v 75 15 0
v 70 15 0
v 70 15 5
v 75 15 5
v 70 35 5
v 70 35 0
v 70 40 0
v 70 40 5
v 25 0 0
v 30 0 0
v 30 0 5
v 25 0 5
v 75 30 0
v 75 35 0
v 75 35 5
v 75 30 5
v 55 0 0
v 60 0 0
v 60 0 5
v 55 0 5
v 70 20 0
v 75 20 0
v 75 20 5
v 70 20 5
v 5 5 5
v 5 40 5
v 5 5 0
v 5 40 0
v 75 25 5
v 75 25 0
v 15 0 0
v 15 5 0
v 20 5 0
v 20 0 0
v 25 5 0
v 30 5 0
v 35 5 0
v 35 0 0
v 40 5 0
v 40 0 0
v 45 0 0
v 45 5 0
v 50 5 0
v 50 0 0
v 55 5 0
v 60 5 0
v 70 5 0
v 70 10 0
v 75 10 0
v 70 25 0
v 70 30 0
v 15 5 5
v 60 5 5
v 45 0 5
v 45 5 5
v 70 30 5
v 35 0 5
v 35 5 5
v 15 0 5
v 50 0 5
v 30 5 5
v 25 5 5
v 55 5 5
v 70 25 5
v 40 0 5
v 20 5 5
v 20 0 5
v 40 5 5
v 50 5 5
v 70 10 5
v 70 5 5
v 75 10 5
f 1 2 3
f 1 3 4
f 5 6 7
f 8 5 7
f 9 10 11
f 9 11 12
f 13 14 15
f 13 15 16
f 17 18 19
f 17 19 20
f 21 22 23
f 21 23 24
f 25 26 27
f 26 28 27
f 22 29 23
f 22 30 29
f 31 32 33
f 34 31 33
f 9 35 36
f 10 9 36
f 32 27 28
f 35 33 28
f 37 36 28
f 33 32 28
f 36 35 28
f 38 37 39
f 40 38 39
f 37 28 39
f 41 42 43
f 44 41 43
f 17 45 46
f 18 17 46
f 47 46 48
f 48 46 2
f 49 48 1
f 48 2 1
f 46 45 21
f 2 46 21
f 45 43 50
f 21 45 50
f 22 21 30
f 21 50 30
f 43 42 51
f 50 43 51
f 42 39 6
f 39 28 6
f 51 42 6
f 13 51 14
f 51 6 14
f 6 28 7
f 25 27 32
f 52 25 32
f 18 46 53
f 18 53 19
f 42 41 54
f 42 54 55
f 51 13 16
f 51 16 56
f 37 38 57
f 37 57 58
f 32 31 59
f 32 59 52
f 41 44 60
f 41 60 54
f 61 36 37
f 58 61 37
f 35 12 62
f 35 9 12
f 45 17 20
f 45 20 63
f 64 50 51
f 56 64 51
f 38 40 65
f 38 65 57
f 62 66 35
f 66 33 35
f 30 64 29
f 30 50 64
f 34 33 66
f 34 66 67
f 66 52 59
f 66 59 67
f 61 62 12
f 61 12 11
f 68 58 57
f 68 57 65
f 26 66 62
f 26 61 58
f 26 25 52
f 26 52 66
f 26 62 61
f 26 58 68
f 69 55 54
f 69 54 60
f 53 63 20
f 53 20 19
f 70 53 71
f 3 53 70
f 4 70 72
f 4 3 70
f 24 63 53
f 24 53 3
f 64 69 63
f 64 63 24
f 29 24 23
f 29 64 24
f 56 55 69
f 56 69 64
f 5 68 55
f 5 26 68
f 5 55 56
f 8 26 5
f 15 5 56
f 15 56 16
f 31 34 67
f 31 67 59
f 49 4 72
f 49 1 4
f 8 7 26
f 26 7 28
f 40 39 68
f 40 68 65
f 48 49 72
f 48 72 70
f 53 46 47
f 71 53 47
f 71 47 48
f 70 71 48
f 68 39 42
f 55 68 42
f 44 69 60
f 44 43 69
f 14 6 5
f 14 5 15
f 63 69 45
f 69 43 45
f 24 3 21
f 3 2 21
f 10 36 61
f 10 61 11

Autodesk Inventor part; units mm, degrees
ref_plane "YZ Plane" through (0, 0, 0) normal (1, 0, 0) x (0, 1, 0)
ref_plane "XZ Plane" through (0, 0, 0) normal (0, 1, 0) x (-1, 0, 0)
ref_plane "XY Plane" through (0, 0, 0) normal (0, 0, 1) x (1, 0, 0)
sketch "Sketch2" plane through (0, 0, 0) normal (0, 0, 1) x (1, 0, 0)
  line L0 (5, 5) -> (70, 5)
  line L1 (70, 5) -> (70, 40)
  line L2 (70, 40) -> (5, 40)
  line L3 (5, 40) -> (5, 5)
  line L4 (15, 5) -> (20, 5)
  line L5 (20, 5) -> (20, 0)
  line L6 (20, 0) -> (15, 0)
  line L7 (15, 0) -> (15, 5)
  line L8 (30, 5) -> (30, 0)
  line L9 (30, 0) -> (25, 0)
  line L10 (25, 0) -> (25, 5)
  line L11 (40, 5) -> (40, 0)
  line L12 (40, 0) -> (35, 0)
  line L13 (35, 0) -> (35, 5)
  line L14 (50, 5) -> (50, 0)
  line L15 (50, 0) -> (45, 0)
  line L16 (45, 0) -> (45, 5)
  line L17 (60, 5) -> (60, 0)
  line L18 (60, 0) -> (55, 0)
  line L19 (55, 0) -> (55, 5)
  line L20 (70, 35) -> (75, 35)
  line L21 (75, 35) -> (75, 30)
  line L22 (75, 30) -> (70, 30)
  line L23 (70, 30) -> (70, 35)
  line L24 (75, 20) -> (70, 20)
  line L25 (70, 25) -> (75, 25)
  line L26 (75, 25) -> (75, 20)
  line L27 (75, 10) -> (70, 10)
  line L28 (70, 15) -> (75, 15)
  line L29 (75, 15) -> (75, 10)
  dimension "d122" = 10
  dimension "d129" = 65
  dimension "d132" = 10
extrude "Extrusion4" add sketch "Sketch2" along normal blind 5
properties part number "backside"
